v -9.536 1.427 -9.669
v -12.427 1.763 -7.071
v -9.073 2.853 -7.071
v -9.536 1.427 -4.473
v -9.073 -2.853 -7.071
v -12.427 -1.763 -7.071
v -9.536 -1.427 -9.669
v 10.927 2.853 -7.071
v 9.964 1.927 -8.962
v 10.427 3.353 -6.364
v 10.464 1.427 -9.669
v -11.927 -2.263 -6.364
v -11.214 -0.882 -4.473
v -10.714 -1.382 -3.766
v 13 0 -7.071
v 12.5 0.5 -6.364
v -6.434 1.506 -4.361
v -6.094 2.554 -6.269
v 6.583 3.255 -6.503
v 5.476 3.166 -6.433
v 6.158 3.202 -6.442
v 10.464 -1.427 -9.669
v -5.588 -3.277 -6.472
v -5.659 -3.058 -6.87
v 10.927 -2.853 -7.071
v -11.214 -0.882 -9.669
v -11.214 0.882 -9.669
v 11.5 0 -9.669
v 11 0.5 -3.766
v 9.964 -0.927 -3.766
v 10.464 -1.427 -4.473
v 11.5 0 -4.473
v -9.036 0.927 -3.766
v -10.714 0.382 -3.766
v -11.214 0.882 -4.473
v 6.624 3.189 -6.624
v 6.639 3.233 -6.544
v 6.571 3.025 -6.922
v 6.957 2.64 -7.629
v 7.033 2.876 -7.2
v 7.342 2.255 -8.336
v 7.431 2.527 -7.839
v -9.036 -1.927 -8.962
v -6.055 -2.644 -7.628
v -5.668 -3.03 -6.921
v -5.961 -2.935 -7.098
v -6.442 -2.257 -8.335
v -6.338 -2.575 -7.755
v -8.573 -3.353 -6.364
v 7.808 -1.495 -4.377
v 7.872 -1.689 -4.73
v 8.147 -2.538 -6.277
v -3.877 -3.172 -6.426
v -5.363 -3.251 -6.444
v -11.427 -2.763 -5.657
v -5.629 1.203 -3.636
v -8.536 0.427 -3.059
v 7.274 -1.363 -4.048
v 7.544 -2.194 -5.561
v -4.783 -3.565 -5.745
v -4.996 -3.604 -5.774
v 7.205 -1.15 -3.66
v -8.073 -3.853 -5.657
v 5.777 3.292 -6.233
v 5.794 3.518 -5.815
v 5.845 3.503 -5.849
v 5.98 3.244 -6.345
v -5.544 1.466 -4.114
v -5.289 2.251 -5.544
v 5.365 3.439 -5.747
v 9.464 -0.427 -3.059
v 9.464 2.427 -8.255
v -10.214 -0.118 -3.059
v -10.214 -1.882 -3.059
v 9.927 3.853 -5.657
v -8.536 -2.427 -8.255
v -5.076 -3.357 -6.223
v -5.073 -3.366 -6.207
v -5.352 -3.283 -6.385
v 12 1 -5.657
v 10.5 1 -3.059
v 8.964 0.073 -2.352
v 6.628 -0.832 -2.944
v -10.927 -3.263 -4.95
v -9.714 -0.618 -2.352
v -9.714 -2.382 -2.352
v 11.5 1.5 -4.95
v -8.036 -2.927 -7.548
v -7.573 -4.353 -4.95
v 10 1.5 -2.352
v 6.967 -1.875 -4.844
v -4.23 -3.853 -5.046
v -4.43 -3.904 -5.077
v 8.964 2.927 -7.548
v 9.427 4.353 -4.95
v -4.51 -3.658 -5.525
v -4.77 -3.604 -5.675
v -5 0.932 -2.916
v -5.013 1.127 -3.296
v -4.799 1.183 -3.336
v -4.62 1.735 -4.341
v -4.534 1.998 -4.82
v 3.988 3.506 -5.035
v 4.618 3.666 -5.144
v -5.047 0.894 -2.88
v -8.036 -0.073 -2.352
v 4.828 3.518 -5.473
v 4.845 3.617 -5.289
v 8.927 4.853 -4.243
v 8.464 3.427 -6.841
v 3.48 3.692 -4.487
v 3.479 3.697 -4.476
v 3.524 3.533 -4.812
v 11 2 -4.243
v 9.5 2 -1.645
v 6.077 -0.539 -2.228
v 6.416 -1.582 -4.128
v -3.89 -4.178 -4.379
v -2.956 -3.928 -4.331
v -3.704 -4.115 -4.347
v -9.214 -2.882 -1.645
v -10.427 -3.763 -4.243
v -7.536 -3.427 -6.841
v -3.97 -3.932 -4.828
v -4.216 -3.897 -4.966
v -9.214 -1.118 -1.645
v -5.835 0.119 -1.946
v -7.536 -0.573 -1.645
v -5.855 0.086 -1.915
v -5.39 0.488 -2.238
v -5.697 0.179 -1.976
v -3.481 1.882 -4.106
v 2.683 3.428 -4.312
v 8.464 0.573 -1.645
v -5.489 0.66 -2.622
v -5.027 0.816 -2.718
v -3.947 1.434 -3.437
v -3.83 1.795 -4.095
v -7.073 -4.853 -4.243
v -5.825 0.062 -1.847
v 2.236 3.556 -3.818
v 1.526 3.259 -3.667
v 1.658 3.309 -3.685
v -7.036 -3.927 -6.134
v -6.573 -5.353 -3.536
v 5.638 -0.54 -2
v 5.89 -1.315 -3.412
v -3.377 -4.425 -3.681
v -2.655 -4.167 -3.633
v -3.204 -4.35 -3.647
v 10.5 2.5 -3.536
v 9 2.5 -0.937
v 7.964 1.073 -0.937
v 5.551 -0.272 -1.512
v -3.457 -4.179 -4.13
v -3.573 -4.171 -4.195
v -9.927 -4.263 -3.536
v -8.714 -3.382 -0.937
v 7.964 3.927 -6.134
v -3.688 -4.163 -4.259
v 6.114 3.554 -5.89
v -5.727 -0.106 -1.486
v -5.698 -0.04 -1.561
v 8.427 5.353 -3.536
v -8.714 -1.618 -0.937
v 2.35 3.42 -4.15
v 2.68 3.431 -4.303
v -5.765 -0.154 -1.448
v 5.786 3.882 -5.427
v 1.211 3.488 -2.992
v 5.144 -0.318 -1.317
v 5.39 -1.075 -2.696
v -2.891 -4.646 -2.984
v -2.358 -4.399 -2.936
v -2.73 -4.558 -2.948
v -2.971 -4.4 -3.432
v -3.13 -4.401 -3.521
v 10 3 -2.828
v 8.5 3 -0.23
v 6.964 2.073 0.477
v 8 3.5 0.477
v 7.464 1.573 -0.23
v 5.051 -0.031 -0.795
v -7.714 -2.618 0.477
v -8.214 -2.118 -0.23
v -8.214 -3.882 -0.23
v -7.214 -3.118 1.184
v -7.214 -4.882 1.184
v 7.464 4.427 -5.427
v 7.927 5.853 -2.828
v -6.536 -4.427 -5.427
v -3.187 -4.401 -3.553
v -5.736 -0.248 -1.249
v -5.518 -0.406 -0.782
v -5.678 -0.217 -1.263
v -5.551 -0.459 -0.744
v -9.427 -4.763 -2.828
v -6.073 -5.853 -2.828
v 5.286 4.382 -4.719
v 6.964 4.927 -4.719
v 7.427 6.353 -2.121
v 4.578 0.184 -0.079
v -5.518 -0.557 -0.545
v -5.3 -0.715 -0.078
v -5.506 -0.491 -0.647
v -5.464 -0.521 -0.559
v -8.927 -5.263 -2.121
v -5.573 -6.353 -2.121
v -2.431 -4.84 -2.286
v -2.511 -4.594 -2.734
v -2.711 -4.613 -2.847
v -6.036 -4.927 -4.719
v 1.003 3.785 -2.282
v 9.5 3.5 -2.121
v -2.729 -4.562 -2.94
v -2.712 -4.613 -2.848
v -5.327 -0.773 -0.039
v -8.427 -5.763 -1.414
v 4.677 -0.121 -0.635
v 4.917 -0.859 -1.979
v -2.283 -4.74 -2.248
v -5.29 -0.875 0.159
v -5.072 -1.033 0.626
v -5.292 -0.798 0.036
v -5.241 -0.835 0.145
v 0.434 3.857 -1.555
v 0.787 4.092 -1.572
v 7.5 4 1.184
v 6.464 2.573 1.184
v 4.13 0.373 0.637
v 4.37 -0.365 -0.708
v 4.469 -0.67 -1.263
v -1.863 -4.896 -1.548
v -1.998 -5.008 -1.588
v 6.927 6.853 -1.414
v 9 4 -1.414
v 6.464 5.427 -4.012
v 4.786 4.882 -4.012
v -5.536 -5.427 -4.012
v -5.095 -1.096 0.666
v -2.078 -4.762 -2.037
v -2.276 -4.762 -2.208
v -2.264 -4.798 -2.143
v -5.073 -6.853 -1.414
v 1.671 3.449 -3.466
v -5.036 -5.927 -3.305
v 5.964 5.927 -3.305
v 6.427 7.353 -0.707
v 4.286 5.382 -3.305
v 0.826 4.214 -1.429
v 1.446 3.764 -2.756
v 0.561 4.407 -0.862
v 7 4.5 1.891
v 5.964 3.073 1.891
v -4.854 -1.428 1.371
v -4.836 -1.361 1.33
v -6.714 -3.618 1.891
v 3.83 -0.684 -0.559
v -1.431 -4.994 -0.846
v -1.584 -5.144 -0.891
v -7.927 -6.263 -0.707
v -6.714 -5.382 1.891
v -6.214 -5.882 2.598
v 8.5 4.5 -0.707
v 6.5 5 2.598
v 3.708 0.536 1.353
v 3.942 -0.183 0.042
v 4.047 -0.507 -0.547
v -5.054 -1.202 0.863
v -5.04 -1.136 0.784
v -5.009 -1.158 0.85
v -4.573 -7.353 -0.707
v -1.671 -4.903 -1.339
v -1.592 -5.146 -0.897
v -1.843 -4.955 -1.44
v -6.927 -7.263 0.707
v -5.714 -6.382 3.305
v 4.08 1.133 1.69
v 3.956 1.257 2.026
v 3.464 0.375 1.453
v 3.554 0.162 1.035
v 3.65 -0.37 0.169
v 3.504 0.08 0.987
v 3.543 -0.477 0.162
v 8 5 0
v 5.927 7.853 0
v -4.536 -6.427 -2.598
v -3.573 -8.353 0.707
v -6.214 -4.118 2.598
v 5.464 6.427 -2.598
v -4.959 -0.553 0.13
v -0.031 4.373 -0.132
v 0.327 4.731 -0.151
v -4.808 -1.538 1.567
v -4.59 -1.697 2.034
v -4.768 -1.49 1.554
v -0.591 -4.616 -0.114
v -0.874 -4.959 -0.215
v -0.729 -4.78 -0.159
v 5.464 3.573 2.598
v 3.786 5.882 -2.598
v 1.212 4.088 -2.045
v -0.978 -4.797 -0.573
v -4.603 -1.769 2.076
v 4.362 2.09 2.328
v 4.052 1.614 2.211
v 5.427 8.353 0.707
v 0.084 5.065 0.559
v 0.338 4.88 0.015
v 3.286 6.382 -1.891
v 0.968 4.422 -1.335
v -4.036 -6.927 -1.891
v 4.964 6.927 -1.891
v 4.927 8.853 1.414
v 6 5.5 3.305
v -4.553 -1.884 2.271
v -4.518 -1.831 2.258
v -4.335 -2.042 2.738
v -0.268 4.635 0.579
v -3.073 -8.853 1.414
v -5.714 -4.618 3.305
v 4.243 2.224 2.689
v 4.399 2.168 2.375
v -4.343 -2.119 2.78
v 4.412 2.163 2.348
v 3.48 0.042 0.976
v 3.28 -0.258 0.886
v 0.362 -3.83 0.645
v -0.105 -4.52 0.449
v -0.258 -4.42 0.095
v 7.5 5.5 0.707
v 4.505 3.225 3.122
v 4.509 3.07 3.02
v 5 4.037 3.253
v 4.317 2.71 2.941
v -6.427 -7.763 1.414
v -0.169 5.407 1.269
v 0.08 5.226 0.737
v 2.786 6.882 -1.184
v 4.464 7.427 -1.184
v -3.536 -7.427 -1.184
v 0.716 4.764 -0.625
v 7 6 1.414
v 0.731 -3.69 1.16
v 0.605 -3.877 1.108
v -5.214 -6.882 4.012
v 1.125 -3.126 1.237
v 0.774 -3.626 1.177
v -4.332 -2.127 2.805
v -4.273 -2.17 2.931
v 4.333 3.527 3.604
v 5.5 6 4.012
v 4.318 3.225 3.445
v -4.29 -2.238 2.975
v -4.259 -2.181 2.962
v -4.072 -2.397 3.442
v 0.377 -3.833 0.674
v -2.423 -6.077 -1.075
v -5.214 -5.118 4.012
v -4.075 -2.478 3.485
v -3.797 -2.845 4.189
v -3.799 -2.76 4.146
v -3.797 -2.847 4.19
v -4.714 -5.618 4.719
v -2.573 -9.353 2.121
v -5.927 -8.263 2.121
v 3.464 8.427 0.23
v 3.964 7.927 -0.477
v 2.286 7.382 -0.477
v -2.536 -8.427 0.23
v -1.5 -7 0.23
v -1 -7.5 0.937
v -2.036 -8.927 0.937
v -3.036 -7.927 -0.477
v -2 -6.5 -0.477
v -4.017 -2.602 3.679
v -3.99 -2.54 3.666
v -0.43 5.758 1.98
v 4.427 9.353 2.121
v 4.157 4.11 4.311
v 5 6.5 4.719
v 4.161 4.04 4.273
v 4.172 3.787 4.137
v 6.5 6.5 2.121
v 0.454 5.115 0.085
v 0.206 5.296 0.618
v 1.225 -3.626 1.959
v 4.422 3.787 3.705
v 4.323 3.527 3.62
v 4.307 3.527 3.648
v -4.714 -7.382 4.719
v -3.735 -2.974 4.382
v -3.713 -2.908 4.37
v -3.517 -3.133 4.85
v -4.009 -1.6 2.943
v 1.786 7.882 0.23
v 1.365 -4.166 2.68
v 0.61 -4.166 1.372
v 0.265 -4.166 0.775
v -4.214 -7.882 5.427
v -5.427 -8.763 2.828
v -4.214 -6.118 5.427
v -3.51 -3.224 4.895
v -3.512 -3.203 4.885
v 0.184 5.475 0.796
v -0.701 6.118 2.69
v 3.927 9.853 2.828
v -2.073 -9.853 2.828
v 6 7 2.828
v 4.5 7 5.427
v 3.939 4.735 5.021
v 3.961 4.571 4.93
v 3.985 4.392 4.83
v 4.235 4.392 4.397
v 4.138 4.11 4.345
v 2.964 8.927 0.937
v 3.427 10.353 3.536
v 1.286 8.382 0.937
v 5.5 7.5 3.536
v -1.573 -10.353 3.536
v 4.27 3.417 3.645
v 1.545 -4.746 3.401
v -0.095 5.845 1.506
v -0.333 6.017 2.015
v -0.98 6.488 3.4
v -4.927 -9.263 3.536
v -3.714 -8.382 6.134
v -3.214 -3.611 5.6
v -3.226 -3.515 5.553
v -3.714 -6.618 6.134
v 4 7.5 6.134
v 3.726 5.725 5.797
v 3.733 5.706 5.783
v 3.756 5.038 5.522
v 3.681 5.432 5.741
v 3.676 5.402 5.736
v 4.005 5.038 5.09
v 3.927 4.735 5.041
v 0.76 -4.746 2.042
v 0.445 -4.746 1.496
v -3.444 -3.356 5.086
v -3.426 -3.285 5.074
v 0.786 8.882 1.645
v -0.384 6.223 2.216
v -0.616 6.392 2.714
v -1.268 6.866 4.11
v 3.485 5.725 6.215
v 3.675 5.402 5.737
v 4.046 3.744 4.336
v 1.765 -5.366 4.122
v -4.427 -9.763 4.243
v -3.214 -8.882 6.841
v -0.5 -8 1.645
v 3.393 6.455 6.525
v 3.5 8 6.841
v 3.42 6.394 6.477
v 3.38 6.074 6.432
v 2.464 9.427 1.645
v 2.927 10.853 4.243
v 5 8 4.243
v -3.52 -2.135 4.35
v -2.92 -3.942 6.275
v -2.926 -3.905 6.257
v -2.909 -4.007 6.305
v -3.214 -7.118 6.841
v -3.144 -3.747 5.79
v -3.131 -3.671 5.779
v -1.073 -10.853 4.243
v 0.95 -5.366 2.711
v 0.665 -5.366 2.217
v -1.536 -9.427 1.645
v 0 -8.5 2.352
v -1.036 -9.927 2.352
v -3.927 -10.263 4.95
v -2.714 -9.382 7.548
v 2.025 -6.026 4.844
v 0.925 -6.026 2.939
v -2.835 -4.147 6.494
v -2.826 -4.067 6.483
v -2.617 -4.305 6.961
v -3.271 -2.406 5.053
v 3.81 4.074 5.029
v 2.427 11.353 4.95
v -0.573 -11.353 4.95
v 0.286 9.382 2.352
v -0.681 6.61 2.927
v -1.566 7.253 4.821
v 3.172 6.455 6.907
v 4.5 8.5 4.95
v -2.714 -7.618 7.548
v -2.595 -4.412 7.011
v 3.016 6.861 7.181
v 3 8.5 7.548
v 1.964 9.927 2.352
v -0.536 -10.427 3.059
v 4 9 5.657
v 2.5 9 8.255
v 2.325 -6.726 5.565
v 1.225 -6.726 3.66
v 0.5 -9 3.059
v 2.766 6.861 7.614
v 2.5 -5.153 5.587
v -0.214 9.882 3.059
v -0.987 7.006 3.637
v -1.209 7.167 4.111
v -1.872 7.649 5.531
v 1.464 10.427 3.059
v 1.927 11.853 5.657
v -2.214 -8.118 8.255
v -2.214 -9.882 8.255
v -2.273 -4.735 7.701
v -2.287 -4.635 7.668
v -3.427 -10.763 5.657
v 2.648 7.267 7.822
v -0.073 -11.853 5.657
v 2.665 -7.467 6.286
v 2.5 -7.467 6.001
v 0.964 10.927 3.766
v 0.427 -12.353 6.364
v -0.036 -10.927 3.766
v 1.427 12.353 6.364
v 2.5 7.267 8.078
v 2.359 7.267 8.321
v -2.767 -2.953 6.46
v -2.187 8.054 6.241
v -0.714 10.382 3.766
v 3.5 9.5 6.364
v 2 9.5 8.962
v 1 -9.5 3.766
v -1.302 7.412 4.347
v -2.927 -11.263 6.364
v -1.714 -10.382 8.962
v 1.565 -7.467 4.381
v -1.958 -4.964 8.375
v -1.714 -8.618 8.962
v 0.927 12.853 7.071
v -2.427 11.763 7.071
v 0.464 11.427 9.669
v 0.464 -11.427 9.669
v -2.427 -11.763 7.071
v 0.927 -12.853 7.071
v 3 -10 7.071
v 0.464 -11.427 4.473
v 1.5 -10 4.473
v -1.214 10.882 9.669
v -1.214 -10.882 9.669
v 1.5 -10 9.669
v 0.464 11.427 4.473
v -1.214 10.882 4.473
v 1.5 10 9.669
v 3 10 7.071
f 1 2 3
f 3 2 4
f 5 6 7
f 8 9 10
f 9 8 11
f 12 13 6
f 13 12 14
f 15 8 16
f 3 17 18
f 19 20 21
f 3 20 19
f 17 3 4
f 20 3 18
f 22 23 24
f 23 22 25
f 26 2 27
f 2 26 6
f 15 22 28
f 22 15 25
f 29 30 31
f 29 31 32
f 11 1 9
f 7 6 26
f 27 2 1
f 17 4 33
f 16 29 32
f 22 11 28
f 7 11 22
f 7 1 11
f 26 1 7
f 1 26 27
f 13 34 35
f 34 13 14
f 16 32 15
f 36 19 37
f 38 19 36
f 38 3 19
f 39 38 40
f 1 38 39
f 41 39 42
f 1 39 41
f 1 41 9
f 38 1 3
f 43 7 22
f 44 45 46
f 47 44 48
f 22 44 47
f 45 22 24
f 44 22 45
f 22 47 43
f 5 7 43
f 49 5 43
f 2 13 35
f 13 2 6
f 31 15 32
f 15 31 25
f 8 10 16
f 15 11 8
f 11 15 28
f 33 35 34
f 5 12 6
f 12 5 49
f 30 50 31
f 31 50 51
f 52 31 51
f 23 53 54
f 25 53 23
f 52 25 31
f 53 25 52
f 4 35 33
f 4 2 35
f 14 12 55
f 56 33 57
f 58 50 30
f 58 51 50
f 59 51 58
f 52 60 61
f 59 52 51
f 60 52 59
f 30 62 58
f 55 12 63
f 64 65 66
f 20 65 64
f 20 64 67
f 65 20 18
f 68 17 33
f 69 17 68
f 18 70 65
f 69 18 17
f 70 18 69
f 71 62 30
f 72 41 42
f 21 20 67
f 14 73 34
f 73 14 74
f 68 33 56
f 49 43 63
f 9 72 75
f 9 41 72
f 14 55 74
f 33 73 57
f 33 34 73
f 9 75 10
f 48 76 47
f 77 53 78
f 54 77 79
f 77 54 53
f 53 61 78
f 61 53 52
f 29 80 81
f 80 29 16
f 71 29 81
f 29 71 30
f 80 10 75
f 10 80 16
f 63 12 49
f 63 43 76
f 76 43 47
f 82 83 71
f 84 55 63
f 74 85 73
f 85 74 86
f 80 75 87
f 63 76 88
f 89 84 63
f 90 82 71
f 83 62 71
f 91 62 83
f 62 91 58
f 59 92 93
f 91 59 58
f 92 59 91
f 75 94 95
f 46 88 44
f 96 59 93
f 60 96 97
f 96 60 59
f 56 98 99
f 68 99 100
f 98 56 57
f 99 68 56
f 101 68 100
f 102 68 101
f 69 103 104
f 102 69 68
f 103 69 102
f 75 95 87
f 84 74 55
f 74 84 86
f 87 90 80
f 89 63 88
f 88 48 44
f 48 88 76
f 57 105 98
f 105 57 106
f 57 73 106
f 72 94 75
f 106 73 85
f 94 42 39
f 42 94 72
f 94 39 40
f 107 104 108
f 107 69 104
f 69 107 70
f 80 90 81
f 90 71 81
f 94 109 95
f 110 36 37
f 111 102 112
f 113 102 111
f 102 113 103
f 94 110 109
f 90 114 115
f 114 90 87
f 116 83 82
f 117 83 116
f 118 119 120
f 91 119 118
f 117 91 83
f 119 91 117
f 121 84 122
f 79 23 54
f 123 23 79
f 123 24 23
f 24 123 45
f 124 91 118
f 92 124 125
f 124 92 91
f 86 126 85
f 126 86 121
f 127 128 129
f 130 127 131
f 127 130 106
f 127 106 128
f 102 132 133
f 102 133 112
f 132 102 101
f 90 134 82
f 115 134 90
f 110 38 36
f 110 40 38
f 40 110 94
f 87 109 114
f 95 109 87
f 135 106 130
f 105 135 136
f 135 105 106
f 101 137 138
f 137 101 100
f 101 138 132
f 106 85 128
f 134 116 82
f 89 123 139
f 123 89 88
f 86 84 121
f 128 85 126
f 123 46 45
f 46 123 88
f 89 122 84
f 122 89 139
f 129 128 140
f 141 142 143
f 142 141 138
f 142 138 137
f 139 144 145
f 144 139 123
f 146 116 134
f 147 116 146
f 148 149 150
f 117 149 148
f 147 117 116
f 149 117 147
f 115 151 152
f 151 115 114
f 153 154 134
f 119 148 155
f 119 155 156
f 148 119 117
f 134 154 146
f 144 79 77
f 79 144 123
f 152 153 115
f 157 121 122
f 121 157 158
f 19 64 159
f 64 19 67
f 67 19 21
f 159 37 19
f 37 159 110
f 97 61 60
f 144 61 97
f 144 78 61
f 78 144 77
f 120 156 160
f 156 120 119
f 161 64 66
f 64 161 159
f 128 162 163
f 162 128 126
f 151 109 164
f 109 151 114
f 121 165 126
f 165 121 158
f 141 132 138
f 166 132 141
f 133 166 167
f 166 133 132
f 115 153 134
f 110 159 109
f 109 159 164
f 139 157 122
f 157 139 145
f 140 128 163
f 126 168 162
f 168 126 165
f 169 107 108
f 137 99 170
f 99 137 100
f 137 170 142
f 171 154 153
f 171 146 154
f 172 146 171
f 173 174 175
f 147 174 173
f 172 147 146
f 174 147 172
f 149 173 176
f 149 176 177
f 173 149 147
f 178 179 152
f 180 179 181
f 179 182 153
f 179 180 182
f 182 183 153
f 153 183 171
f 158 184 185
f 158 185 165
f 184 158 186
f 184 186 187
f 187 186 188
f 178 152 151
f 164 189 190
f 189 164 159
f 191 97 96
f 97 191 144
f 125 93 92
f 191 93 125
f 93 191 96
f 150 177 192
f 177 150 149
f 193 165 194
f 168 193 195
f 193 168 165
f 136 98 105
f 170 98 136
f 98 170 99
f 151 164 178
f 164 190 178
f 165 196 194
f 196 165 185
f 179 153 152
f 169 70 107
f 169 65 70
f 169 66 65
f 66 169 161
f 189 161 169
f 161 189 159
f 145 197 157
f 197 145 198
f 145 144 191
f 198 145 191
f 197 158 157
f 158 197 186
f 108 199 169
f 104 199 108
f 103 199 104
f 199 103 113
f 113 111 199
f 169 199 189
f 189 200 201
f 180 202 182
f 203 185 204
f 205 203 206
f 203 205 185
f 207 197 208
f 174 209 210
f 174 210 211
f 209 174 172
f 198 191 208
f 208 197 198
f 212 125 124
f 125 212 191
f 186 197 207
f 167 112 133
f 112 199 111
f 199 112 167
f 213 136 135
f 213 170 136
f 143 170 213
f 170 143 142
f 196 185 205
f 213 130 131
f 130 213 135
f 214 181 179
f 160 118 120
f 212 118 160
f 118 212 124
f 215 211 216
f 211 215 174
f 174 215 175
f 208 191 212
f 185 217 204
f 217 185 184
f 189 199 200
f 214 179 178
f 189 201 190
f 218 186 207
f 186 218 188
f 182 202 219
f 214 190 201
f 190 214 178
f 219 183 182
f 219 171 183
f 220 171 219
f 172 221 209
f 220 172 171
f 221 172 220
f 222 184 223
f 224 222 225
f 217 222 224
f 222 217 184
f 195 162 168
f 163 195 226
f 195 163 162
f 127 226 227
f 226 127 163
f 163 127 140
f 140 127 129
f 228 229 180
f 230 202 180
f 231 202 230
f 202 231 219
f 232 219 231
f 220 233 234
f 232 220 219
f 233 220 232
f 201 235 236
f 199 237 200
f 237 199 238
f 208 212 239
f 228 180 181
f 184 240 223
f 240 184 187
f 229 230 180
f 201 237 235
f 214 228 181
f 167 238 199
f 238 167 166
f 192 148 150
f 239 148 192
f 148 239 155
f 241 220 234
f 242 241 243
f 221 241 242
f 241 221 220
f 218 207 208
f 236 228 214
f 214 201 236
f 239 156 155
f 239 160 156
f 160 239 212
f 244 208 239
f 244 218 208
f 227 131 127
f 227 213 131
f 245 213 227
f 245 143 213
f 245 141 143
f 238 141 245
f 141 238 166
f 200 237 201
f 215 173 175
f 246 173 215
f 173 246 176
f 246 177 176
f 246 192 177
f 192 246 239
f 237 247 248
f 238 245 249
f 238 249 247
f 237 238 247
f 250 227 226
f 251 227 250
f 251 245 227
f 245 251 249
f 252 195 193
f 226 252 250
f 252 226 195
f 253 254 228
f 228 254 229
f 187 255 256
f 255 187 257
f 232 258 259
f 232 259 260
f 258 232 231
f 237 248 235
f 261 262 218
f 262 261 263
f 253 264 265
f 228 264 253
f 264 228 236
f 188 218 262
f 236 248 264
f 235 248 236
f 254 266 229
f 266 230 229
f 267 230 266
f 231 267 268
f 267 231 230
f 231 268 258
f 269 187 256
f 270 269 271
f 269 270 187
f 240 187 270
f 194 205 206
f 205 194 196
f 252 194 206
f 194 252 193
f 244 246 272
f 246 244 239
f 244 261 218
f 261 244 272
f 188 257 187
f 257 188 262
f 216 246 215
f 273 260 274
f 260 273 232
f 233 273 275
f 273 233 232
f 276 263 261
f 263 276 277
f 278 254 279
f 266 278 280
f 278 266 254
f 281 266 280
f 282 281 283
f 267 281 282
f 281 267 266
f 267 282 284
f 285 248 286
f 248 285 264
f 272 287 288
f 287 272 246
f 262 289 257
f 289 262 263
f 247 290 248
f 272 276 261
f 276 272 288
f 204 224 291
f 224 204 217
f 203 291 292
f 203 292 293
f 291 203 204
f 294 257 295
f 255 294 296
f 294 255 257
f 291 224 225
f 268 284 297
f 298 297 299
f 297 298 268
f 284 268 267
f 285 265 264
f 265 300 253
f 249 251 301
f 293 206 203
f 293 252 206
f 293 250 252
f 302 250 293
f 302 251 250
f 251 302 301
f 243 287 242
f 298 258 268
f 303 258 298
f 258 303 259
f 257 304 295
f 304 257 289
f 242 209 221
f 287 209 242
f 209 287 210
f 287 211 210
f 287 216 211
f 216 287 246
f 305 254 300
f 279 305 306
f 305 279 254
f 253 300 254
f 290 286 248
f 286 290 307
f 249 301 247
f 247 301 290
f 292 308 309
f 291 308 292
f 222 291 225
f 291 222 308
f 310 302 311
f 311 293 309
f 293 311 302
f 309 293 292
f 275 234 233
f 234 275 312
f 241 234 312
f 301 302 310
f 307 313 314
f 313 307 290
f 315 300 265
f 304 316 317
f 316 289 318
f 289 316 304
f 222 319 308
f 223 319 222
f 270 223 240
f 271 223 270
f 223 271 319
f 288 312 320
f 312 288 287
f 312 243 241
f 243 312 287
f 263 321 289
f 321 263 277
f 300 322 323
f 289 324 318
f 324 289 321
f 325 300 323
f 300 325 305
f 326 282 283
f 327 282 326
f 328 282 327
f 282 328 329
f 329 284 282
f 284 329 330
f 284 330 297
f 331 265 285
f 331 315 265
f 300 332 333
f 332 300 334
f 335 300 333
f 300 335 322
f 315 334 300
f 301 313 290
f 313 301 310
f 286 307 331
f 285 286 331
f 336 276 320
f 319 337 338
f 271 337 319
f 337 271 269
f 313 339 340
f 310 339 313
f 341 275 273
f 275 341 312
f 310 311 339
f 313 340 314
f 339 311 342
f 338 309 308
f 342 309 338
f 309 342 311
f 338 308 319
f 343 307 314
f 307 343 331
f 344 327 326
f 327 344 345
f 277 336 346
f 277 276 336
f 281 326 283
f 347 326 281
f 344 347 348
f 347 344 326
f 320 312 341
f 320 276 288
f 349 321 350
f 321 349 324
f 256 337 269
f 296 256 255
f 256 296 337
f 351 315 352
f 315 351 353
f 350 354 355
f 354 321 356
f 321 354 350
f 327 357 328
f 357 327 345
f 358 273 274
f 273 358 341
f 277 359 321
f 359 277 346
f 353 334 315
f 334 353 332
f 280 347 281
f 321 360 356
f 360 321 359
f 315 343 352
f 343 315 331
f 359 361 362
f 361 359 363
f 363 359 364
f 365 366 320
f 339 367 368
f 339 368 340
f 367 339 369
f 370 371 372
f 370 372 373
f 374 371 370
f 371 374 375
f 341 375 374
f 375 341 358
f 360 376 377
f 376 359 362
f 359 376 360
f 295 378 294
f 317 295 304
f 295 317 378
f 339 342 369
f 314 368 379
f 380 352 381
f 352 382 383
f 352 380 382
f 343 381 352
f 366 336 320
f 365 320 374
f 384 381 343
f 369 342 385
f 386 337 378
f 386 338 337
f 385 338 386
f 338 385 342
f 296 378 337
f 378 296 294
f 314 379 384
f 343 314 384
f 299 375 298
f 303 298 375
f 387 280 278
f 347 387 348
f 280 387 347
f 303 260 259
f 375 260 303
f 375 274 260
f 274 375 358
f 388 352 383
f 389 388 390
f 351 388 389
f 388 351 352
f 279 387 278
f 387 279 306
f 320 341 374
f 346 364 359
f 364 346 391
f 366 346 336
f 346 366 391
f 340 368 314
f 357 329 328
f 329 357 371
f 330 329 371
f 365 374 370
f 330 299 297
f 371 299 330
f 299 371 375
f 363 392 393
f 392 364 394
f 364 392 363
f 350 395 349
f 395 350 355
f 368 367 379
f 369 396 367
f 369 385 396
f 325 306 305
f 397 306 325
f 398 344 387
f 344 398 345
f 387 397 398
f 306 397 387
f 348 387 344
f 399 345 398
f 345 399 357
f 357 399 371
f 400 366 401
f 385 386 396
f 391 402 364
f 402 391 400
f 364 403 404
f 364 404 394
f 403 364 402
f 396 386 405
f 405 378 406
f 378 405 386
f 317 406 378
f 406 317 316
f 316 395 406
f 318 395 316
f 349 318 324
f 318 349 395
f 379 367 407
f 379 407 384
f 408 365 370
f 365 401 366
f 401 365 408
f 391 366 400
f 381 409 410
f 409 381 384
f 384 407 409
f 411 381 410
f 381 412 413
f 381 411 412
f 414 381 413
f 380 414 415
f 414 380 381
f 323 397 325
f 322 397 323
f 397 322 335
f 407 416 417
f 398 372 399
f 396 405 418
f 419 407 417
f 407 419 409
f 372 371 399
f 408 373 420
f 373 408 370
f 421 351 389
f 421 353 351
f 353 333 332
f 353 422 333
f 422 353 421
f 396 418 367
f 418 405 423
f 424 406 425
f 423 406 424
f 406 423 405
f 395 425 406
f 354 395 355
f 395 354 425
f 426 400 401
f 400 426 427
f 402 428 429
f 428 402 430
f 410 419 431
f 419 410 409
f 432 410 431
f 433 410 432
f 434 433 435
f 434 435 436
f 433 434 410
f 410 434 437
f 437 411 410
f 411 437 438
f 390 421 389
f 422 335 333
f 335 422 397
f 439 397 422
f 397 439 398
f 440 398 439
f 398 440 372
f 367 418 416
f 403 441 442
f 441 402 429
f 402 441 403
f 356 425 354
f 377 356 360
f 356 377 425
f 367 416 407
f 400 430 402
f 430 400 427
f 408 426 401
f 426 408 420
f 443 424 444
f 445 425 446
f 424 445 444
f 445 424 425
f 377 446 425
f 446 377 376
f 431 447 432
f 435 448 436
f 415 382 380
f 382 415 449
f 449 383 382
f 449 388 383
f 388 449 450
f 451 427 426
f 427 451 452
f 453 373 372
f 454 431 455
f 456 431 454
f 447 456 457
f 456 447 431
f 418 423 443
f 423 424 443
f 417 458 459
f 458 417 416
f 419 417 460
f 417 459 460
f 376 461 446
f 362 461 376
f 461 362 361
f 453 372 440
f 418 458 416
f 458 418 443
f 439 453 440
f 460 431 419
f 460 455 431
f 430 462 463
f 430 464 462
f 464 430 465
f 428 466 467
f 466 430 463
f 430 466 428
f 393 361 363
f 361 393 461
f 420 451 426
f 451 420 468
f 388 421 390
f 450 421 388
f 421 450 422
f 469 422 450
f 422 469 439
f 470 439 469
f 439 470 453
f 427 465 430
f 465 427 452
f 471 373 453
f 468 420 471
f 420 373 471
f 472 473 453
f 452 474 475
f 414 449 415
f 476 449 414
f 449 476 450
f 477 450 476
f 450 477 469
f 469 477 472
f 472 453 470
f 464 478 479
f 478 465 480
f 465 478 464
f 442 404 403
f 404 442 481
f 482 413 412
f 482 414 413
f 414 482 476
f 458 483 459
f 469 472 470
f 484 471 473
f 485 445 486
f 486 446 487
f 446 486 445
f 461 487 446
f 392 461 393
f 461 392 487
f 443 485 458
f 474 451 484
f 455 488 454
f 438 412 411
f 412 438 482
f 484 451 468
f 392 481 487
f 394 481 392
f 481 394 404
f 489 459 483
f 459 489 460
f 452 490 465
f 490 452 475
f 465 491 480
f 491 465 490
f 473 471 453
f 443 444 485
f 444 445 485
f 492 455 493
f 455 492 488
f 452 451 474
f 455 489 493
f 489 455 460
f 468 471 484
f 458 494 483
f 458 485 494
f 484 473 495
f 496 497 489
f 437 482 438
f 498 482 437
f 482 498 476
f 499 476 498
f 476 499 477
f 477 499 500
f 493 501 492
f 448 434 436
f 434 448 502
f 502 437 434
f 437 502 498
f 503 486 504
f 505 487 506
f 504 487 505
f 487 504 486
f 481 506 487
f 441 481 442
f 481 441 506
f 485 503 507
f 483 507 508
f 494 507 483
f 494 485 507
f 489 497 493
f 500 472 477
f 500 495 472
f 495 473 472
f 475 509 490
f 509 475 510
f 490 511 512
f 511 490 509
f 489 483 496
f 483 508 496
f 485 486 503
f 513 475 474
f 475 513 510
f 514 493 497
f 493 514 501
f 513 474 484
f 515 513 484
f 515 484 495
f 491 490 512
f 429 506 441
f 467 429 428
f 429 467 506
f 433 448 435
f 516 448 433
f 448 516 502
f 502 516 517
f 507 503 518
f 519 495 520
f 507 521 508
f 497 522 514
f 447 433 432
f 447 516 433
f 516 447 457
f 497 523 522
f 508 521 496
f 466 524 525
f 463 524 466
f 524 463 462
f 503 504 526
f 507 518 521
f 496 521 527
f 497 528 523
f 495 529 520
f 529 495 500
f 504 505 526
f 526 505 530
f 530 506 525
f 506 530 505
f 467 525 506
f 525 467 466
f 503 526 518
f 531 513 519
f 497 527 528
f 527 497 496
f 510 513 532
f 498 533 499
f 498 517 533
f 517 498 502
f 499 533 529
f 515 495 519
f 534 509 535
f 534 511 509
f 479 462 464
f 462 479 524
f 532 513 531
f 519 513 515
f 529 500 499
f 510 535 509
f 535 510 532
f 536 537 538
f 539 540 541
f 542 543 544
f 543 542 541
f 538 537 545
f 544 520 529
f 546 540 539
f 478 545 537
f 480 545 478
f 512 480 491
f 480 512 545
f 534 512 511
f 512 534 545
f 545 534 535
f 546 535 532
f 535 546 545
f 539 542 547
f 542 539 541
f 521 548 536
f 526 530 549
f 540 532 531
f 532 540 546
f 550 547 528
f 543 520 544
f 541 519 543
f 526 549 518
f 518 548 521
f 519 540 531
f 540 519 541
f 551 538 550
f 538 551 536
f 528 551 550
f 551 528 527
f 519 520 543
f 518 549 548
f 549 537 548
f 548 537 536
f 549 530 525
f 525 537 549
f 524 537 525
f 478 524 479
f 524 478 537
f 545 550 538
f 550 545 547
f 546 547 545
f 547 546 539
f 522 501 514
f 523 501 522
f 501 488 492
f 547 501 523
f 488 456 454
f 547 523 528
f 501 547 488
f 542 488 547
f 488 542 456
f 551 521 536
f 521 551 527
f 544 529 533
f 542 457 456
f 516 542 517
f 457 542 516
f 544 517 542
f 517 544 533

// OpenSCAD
// Generated by SolidPython 0.4.6 on 2020-02-08 17:55:44
$fa = .01;
$fs = 1;


scale(v = [10.0000000000, 10.0000000000, 10.0000000000]) {
	union() {
		hull() {
			hull() {
				translate(v = [1.0000000000, 0.0000000000, -0.7071067812]) {
					sphere(r = 0.3000000000);
				}
				translate(v = [-1.0000000000, 0.0000000000, -0.7071067812]) {
					sphere(r = 0.3000000000);
				}
			}
			hull() {
				translate(v = [0.9500000000, 0.0500000000, -0.6363961031]) {
					sphere(r = 0.3000000000);
				}
				translate(v = [-0.9500000000, -0.0500000000, -0.6363961031]) {
					sphere(r = 0.3000000000);
				}
			}
		}
		hull() {
			hull() {
				translate(v = [0.9500000000, 0.0500000000, -0.6363961031]) {
					sphere(r = 0.3000000000);
				}
				translate(v = [-0.9500000000, -0.0500000000, -0.6363961031]) {
					sphere(r = 0.3000000000);
				}
			}
			hull() {
				translate(v = [0.9000000000, 0.1000000000, -0.5656854249]) {
					sphere(r = 0.3000000000);
				}
				translate(v = [-0.9000000000, -0.1000000000, -0.5656854249]) {
					sphere(r = 0.3000000000);
				}
			}
		}
		hull() {
			hull() {
				translate(v = [0.9000000000, 0.1000000000, -0.5656854249]) {
					sphere(r = 0.3000000000);
				}
				translate(v = [-0.9000000000, -0.1000000000, -0.5656854249]) {
					sphere(r = 0.3000000000);
				}
			}
			hull() {
				translate(v = [0.8500000000, 0.1500000000, -0.4949747468]) {
					sphere(r = 0.3000000000);
				}
				translate(v = [-0.8500000000, -0.1500000000, -0.4949747468]) {
					sphere(r = 0.3000000000);
				}
			}
		}
		hull() {
			hull() {
				translate(v = [0.8500000000, 0.1500000000, -0.4949747468]) {
					sphere(r = 0.3000000000);
				}
				translate(v = [-0.8500000000, -0.1500000000, -0.4949747468]) {
					sphere(r = 0.3000000000);
				}
			}
			hull() {
				translate(v = [0.8000000000, 0.2000000000, -0.4242640687]) {
					sphere(r = 0.3000000000);
				}
				translate(v = [-0.8000000000, -0.2000000000, -0.4242640687]) {
					sphere(r = 0.3000000000);
				}
			}
		}
		hull() {
			hull() {
				translate(v = [0.8000000000, 0.2000000000, -0.4242640687]) {
					sphere(r = 0.3000000000);
				}
				translate(v = [-0.8000000000, -0.2000000000, -0.4242640687]) {
					sphere(r = 0.3000000000);
				}
			}
			hull() {
				translate(v = [0.7500000000, 0.2500000000, -0.3535533906]) {
					sphere(r = 0.3000000000);
				}
				translate(v = [-0.7500000000, -0.2500000000, -0.3535533906]) {
					sphere(r = 0.3000000000);
				}
			}
		}
		hull() {
			hull() {
				translate(v = [0.7500000000, 0.2500000000, -0.3535533906]) {
					sphere(r = 0.3000000000);
				}
				translate(v = [-0.7500000000, -0.2500000000, -0.3535533906]) {
					sphere(r = 0.3000000000);
				}
			}
			hull() {
				translate(v = [0.7000000000, 0.3000000000, -0.2828427125]) {
					sphere(r = 0.3000000000);
				}
				translate(v = [-0.7000000000, -0.3000000000, -0.2828427125]) {
					sphere(r = 0.3000000000);
				}
			}
		}
		hull() {
			hull() {
				translate(v = [0.7000000000, 0.3000000000, -0.2828427125]) {
					sphere(r = 0.3000000000);
				}
				translate(v = [-0.7000000000, -0.3000000000, -0.2828427125]) {
					sphere(r = 0.3000000000);
				}
			}
			hull() {
				translate(v = [0.6500000000, 0.3500000000, -0.2121320344]) {
					sphere(r = 0.3000000000);
				}
				translate(v = [-0.6500000000, -0.3500000000, -0.2121320344]) {
					sphere(r = 0.3000000000);
				}
			}
		}
		hull() {
			hull() {
				translate(v = [0.6500000000, 0.3500000000, -0.2121320344]) {
					sphere(r = 0.3000000000);
				}
				translate(v = [-0.6500000000, -0.3500000000, -0.2121320344]) {
					sphere(r = 0.3000000000);
				}
			}
			hull() {
				translate(v = [0.6000000000, 0.4000000000, -0.1414213562]) {
					sphere(r = 0.3000000000);
				}
				translate(v = [-0.6000000000, -0.4000000000, -0.1414213562]) {
					sphere(r = 0.3000000000);
				}
			}
		}
		hull() {
			hull() {
				translate(v = [0.6000000000, 0.4000000000, -0.1414213562]) {
					sphere(r = 0.3000000000);
				}
				translate(v = [-0.6000000000, -0.4000000000, -0.1414213562]) {
					sphere(r = 0.3000000000);
				}
			}
			hull() {
				translate(v = [0.5500000000, 0.4500000000, -0.0707106781]) {
					sphere(r = 0.3000000000);
				}
				translate(v = [-0.5500000000, -0.4500000000, -0.0707106781]) {
					sphere(r = 0.3000000000);
				}
			}
		}
		hull() {
			hull() {
				translate(v = [0.5500000000, 0.4500000000, -0.0707106781]) {
					sphere(r = 0.3000000000);
				}
				translate(v = [-0.5500000000, -0.4500000000, -0.0707106781]) {
					sphere(r = 0.3000000000);
				}
			}
			hull() {
				translate(v = [0.5000000000, 0.5000000000, 0.0000000000]) {
					sphere(r = 0.3000000000);
				}
				translate(v = [-0.5000000000, -0.5000000000, 0.0000000000]) {
					sphere(r = 0.3000000000);
				}
			}
		}
		hull() {
			hull() {
				translate(v = [0.5000000000, 0.5000000000, 0.0000000000]) {
					sphere(r = 0.3000000000);
				}
				translate(v = [-0.5000000000, -0.5000000000, 0.0000000000]) {
					sphere(r = 0.3000000000);
				}
			}
			hull() {
				translate(v = [0.4500000000, 0.5500000000, 0.0707106781]) {
					sphere(r = 0.3000000000);
				}
				translate(v = [-0.4500000000, -0.5500000000, 0.0707106781]) {
					sphere(r = 0.3000000000);
				}
			}
		}
		hull() {
			hull() {
				translate(v = [0.4500000000, 0.5500000000, 0.0707106781]) {
					sphere(r = 0.3000000000);
				}
				translate(v = [-0.4500000000, -0.5500000000, 0.0707106781]) {
					sphere(r = 0.3000000000);
				}
			}
			hull() {
				translate(v = [0.4000000000, 0.6000000000, 0.1414213562]) {
					sphere(r = 0.3000000000);
				}
				translate(v = [-0.4000000000, -0.6000000000, 0.1414213562]) {
					sphere(r = 0.3000000000);
				}
			}
		}
		hull() {
			hull() {
				translate(v = [0.4000000000, 0.6000000000, 0.1414213562]) {
					sphere(r = 0.3000000000);
				}
				translate(v = [-0.4000000000, -0.6000000000, 0.1414213562]) {
					sphere(r = 0.3000000000);
				}
			}
			hull() {
				translate(v = [0.3500000000, 0.6500000000, 0.2121320344]) {
					sphere(r = 0.3000000000);
				}
				translate(v = [-0.3500000000, -0.6500000000, 0.2121320344]) {
					sphere(r = 0.3000000000);
				}
			}
		}
		hull() {
			hull() {
				translate(v = [0.3500000000, 0.6500000000, 0.2121320344]) {
					sphere(r = 0.3000000000);
				}
				translate(v = [-0.3500000000, -0.6500000000, 0.2121320344]) {
					sphere(r = 0.3000000000);
				}
			}
			hull() {
				translate(v = [0.3000000000, 0.7000000000, 0.2828427125]) {
					sphere(r = 0.3000000000);
				}
				translate(v = [-0.3000000000, -0.7000000000, 0.2828427125]) {
					sphere(r = 0.3000000000);
				}
			}
		}
		hull() {
			hull() {
				translate(v = [0.3000000000, 0.7000000000, 0.2828427125]) {
					sphere(r = 0.3000000000);
				}
				translate(v = [-0.3000000000, -0.7000000000, 0.2828427125]) {
					sphere(r = 0.3000000000);
				}
			}
			hull() {
				translate(v = [0.2500000000, 0.7500000000, 0.3535533906]) {
					sphere(r = 0.3000000000);
				}
				translate(v = [-0.2500000000, -0.7500000000, 0.3535533906]) {
					sphere(r = 0.3000000000);
				}
			}
		}
		hull() {
			hull() {
				translate(v = [0.2500000000, 0.7500000000, 0.3535533906]) {
					sphere(r = 0.3000000000);
				}
				translate(v = [-0.2500000000, -0.7500000000, 0.3535533906]) {
					sphere(r = 0.3000000000);
				}
			}
			hull() {
				translate(v = [0.2000000000, 0.8000000000, 0.4242640687]) {
					sphere(r = 0.3000000000);
				}
				translate(v = [-0.2000000000, -0.8000000000, 0.4242640687]) {
					sphere(r = 0.3000000000);
				}
			}
		}
		hull() {
			hull() {
				translate(v = [0.2000000000, 0.8000000000, 0.4242640687]) {
					sphere(r = 0.3000000000);
				}
				translate(v = [-0.2000000000, -0.8000000000, 0.4242640687]) {
					sphere(r = 0.3000000000);
				}
			}
			hull() {
				translate(v = [0.1500000000, 0.8500000000, 0.4949747468]) {
					sphere(r = 0.3000000000);
				}
				translate(v = [-0.1500000000, -0.8500000000, 0.4949747468]) {
					sphere(r = 0.3000000000);
				}
			}
		}
		hull() {
			hull() {
				translate(v = [0.1500000000, 0.8500000000, 0.4949747468]) {
					sphere(r = 0.3000000000);
				}
				translate(v = [-0.1500000000, -0.8500000000, 0.4949747468]) {
					sphere(r = 0.3000000000);
				}
			}
			hull() {
				translate(v = [0.1000000000, 0.9000000000, 0.5656854249]) {
					sphere(r = 0.3000000000);
				}
				translate(v = [-0.1000000000, -0.9000000000, 0.5656854249]) {
					sphere(r = 0.3000000000);
				}
			}
		}
		hull() {
			hull() {
				translate(v = [0.1000000000, 0.9000000000, 0.5656854249]) {
					sphere(r = 0.3000000000);
				}
				translate(v = [-0.1000000000, -0.9000000000, 0.5656854249]) {
					sphere(r = 0.3000000000);
				}
			}
			hull() {
				translate(v = [0.0500000000, 0.9500000000, 0.6363961031]) {
					sphere(r = 0.3000000000);
				}
				translate(v = [-0.0500000000, -0.9500000000, 0.6363961031]) {
					sphere(r = 0.3000000000);
				}
			}
		}
		hull() {
			hull() {
				translate(v = [0.0500000000, 0.9500000000, 0.6363961031]) {
					sphere(r = 0.3000000000);
				}
				translate(v = [-0.0500000000, -0.9500000000, 0.6363961031]) {
					sphere(r = 0.3000000000);
				}
			}
			hull() {
				translate(v = [0.0000000000, 1.0000000000, 0.7071067812]) {
					sphere(r = 0.3000000000);
				}
				translate(v = [0.0000000000, -1.0000000000, 0.7071067812]) {
					sphere(r = 0.3000000000);
				}
			}
		}
	}
}
/***********************************************
*********      SolidPython code:      **********
************************************************
 
from solid import *
from solid.utils import *


def line(a, b, r=1.0):
    return hull()(
        translate(a)(sphere(r=r)),
        translate(b)(sphere(r=r))
    )


def mix(p1, p2, a):
    if len(p1) != len(p2):
        raise IndexError()
    return [(x * (1-a)) + (y * a) for x, y in zip(p1, p2)]


def pairwise_hull(objs):
    return sum(hull()(a,b) for a,b in zip(objs, objs[1:]))


a0 = [ 1,  0, -sqrt(.5)]
a1 = [ 0,  1,  sqrt(.5)]
b0 = [-1,  0, -sqrt(.5)]
b1 = [ 0, -1,  sqrt(.5)]

def d4_twist():
    out = []
    thickness = 6
    size = 20
    minscale = 1
    for i in range(int(size/minscale) + 1):
        i = i/int(size/minscale)
        out.append(line(mix(a0, a1, i),mix(b0, b1, i), thickness/size))

    out = scale([size/2] * 3)(pairwise_hull(out))

    scad_render_to_file(out, 'd4_twist.scad', file_header=f'$fa = .01;\n$fs = {minscale};\n')


if __name__ == '__main__':
    d4_twist() 
 
************************************************/
